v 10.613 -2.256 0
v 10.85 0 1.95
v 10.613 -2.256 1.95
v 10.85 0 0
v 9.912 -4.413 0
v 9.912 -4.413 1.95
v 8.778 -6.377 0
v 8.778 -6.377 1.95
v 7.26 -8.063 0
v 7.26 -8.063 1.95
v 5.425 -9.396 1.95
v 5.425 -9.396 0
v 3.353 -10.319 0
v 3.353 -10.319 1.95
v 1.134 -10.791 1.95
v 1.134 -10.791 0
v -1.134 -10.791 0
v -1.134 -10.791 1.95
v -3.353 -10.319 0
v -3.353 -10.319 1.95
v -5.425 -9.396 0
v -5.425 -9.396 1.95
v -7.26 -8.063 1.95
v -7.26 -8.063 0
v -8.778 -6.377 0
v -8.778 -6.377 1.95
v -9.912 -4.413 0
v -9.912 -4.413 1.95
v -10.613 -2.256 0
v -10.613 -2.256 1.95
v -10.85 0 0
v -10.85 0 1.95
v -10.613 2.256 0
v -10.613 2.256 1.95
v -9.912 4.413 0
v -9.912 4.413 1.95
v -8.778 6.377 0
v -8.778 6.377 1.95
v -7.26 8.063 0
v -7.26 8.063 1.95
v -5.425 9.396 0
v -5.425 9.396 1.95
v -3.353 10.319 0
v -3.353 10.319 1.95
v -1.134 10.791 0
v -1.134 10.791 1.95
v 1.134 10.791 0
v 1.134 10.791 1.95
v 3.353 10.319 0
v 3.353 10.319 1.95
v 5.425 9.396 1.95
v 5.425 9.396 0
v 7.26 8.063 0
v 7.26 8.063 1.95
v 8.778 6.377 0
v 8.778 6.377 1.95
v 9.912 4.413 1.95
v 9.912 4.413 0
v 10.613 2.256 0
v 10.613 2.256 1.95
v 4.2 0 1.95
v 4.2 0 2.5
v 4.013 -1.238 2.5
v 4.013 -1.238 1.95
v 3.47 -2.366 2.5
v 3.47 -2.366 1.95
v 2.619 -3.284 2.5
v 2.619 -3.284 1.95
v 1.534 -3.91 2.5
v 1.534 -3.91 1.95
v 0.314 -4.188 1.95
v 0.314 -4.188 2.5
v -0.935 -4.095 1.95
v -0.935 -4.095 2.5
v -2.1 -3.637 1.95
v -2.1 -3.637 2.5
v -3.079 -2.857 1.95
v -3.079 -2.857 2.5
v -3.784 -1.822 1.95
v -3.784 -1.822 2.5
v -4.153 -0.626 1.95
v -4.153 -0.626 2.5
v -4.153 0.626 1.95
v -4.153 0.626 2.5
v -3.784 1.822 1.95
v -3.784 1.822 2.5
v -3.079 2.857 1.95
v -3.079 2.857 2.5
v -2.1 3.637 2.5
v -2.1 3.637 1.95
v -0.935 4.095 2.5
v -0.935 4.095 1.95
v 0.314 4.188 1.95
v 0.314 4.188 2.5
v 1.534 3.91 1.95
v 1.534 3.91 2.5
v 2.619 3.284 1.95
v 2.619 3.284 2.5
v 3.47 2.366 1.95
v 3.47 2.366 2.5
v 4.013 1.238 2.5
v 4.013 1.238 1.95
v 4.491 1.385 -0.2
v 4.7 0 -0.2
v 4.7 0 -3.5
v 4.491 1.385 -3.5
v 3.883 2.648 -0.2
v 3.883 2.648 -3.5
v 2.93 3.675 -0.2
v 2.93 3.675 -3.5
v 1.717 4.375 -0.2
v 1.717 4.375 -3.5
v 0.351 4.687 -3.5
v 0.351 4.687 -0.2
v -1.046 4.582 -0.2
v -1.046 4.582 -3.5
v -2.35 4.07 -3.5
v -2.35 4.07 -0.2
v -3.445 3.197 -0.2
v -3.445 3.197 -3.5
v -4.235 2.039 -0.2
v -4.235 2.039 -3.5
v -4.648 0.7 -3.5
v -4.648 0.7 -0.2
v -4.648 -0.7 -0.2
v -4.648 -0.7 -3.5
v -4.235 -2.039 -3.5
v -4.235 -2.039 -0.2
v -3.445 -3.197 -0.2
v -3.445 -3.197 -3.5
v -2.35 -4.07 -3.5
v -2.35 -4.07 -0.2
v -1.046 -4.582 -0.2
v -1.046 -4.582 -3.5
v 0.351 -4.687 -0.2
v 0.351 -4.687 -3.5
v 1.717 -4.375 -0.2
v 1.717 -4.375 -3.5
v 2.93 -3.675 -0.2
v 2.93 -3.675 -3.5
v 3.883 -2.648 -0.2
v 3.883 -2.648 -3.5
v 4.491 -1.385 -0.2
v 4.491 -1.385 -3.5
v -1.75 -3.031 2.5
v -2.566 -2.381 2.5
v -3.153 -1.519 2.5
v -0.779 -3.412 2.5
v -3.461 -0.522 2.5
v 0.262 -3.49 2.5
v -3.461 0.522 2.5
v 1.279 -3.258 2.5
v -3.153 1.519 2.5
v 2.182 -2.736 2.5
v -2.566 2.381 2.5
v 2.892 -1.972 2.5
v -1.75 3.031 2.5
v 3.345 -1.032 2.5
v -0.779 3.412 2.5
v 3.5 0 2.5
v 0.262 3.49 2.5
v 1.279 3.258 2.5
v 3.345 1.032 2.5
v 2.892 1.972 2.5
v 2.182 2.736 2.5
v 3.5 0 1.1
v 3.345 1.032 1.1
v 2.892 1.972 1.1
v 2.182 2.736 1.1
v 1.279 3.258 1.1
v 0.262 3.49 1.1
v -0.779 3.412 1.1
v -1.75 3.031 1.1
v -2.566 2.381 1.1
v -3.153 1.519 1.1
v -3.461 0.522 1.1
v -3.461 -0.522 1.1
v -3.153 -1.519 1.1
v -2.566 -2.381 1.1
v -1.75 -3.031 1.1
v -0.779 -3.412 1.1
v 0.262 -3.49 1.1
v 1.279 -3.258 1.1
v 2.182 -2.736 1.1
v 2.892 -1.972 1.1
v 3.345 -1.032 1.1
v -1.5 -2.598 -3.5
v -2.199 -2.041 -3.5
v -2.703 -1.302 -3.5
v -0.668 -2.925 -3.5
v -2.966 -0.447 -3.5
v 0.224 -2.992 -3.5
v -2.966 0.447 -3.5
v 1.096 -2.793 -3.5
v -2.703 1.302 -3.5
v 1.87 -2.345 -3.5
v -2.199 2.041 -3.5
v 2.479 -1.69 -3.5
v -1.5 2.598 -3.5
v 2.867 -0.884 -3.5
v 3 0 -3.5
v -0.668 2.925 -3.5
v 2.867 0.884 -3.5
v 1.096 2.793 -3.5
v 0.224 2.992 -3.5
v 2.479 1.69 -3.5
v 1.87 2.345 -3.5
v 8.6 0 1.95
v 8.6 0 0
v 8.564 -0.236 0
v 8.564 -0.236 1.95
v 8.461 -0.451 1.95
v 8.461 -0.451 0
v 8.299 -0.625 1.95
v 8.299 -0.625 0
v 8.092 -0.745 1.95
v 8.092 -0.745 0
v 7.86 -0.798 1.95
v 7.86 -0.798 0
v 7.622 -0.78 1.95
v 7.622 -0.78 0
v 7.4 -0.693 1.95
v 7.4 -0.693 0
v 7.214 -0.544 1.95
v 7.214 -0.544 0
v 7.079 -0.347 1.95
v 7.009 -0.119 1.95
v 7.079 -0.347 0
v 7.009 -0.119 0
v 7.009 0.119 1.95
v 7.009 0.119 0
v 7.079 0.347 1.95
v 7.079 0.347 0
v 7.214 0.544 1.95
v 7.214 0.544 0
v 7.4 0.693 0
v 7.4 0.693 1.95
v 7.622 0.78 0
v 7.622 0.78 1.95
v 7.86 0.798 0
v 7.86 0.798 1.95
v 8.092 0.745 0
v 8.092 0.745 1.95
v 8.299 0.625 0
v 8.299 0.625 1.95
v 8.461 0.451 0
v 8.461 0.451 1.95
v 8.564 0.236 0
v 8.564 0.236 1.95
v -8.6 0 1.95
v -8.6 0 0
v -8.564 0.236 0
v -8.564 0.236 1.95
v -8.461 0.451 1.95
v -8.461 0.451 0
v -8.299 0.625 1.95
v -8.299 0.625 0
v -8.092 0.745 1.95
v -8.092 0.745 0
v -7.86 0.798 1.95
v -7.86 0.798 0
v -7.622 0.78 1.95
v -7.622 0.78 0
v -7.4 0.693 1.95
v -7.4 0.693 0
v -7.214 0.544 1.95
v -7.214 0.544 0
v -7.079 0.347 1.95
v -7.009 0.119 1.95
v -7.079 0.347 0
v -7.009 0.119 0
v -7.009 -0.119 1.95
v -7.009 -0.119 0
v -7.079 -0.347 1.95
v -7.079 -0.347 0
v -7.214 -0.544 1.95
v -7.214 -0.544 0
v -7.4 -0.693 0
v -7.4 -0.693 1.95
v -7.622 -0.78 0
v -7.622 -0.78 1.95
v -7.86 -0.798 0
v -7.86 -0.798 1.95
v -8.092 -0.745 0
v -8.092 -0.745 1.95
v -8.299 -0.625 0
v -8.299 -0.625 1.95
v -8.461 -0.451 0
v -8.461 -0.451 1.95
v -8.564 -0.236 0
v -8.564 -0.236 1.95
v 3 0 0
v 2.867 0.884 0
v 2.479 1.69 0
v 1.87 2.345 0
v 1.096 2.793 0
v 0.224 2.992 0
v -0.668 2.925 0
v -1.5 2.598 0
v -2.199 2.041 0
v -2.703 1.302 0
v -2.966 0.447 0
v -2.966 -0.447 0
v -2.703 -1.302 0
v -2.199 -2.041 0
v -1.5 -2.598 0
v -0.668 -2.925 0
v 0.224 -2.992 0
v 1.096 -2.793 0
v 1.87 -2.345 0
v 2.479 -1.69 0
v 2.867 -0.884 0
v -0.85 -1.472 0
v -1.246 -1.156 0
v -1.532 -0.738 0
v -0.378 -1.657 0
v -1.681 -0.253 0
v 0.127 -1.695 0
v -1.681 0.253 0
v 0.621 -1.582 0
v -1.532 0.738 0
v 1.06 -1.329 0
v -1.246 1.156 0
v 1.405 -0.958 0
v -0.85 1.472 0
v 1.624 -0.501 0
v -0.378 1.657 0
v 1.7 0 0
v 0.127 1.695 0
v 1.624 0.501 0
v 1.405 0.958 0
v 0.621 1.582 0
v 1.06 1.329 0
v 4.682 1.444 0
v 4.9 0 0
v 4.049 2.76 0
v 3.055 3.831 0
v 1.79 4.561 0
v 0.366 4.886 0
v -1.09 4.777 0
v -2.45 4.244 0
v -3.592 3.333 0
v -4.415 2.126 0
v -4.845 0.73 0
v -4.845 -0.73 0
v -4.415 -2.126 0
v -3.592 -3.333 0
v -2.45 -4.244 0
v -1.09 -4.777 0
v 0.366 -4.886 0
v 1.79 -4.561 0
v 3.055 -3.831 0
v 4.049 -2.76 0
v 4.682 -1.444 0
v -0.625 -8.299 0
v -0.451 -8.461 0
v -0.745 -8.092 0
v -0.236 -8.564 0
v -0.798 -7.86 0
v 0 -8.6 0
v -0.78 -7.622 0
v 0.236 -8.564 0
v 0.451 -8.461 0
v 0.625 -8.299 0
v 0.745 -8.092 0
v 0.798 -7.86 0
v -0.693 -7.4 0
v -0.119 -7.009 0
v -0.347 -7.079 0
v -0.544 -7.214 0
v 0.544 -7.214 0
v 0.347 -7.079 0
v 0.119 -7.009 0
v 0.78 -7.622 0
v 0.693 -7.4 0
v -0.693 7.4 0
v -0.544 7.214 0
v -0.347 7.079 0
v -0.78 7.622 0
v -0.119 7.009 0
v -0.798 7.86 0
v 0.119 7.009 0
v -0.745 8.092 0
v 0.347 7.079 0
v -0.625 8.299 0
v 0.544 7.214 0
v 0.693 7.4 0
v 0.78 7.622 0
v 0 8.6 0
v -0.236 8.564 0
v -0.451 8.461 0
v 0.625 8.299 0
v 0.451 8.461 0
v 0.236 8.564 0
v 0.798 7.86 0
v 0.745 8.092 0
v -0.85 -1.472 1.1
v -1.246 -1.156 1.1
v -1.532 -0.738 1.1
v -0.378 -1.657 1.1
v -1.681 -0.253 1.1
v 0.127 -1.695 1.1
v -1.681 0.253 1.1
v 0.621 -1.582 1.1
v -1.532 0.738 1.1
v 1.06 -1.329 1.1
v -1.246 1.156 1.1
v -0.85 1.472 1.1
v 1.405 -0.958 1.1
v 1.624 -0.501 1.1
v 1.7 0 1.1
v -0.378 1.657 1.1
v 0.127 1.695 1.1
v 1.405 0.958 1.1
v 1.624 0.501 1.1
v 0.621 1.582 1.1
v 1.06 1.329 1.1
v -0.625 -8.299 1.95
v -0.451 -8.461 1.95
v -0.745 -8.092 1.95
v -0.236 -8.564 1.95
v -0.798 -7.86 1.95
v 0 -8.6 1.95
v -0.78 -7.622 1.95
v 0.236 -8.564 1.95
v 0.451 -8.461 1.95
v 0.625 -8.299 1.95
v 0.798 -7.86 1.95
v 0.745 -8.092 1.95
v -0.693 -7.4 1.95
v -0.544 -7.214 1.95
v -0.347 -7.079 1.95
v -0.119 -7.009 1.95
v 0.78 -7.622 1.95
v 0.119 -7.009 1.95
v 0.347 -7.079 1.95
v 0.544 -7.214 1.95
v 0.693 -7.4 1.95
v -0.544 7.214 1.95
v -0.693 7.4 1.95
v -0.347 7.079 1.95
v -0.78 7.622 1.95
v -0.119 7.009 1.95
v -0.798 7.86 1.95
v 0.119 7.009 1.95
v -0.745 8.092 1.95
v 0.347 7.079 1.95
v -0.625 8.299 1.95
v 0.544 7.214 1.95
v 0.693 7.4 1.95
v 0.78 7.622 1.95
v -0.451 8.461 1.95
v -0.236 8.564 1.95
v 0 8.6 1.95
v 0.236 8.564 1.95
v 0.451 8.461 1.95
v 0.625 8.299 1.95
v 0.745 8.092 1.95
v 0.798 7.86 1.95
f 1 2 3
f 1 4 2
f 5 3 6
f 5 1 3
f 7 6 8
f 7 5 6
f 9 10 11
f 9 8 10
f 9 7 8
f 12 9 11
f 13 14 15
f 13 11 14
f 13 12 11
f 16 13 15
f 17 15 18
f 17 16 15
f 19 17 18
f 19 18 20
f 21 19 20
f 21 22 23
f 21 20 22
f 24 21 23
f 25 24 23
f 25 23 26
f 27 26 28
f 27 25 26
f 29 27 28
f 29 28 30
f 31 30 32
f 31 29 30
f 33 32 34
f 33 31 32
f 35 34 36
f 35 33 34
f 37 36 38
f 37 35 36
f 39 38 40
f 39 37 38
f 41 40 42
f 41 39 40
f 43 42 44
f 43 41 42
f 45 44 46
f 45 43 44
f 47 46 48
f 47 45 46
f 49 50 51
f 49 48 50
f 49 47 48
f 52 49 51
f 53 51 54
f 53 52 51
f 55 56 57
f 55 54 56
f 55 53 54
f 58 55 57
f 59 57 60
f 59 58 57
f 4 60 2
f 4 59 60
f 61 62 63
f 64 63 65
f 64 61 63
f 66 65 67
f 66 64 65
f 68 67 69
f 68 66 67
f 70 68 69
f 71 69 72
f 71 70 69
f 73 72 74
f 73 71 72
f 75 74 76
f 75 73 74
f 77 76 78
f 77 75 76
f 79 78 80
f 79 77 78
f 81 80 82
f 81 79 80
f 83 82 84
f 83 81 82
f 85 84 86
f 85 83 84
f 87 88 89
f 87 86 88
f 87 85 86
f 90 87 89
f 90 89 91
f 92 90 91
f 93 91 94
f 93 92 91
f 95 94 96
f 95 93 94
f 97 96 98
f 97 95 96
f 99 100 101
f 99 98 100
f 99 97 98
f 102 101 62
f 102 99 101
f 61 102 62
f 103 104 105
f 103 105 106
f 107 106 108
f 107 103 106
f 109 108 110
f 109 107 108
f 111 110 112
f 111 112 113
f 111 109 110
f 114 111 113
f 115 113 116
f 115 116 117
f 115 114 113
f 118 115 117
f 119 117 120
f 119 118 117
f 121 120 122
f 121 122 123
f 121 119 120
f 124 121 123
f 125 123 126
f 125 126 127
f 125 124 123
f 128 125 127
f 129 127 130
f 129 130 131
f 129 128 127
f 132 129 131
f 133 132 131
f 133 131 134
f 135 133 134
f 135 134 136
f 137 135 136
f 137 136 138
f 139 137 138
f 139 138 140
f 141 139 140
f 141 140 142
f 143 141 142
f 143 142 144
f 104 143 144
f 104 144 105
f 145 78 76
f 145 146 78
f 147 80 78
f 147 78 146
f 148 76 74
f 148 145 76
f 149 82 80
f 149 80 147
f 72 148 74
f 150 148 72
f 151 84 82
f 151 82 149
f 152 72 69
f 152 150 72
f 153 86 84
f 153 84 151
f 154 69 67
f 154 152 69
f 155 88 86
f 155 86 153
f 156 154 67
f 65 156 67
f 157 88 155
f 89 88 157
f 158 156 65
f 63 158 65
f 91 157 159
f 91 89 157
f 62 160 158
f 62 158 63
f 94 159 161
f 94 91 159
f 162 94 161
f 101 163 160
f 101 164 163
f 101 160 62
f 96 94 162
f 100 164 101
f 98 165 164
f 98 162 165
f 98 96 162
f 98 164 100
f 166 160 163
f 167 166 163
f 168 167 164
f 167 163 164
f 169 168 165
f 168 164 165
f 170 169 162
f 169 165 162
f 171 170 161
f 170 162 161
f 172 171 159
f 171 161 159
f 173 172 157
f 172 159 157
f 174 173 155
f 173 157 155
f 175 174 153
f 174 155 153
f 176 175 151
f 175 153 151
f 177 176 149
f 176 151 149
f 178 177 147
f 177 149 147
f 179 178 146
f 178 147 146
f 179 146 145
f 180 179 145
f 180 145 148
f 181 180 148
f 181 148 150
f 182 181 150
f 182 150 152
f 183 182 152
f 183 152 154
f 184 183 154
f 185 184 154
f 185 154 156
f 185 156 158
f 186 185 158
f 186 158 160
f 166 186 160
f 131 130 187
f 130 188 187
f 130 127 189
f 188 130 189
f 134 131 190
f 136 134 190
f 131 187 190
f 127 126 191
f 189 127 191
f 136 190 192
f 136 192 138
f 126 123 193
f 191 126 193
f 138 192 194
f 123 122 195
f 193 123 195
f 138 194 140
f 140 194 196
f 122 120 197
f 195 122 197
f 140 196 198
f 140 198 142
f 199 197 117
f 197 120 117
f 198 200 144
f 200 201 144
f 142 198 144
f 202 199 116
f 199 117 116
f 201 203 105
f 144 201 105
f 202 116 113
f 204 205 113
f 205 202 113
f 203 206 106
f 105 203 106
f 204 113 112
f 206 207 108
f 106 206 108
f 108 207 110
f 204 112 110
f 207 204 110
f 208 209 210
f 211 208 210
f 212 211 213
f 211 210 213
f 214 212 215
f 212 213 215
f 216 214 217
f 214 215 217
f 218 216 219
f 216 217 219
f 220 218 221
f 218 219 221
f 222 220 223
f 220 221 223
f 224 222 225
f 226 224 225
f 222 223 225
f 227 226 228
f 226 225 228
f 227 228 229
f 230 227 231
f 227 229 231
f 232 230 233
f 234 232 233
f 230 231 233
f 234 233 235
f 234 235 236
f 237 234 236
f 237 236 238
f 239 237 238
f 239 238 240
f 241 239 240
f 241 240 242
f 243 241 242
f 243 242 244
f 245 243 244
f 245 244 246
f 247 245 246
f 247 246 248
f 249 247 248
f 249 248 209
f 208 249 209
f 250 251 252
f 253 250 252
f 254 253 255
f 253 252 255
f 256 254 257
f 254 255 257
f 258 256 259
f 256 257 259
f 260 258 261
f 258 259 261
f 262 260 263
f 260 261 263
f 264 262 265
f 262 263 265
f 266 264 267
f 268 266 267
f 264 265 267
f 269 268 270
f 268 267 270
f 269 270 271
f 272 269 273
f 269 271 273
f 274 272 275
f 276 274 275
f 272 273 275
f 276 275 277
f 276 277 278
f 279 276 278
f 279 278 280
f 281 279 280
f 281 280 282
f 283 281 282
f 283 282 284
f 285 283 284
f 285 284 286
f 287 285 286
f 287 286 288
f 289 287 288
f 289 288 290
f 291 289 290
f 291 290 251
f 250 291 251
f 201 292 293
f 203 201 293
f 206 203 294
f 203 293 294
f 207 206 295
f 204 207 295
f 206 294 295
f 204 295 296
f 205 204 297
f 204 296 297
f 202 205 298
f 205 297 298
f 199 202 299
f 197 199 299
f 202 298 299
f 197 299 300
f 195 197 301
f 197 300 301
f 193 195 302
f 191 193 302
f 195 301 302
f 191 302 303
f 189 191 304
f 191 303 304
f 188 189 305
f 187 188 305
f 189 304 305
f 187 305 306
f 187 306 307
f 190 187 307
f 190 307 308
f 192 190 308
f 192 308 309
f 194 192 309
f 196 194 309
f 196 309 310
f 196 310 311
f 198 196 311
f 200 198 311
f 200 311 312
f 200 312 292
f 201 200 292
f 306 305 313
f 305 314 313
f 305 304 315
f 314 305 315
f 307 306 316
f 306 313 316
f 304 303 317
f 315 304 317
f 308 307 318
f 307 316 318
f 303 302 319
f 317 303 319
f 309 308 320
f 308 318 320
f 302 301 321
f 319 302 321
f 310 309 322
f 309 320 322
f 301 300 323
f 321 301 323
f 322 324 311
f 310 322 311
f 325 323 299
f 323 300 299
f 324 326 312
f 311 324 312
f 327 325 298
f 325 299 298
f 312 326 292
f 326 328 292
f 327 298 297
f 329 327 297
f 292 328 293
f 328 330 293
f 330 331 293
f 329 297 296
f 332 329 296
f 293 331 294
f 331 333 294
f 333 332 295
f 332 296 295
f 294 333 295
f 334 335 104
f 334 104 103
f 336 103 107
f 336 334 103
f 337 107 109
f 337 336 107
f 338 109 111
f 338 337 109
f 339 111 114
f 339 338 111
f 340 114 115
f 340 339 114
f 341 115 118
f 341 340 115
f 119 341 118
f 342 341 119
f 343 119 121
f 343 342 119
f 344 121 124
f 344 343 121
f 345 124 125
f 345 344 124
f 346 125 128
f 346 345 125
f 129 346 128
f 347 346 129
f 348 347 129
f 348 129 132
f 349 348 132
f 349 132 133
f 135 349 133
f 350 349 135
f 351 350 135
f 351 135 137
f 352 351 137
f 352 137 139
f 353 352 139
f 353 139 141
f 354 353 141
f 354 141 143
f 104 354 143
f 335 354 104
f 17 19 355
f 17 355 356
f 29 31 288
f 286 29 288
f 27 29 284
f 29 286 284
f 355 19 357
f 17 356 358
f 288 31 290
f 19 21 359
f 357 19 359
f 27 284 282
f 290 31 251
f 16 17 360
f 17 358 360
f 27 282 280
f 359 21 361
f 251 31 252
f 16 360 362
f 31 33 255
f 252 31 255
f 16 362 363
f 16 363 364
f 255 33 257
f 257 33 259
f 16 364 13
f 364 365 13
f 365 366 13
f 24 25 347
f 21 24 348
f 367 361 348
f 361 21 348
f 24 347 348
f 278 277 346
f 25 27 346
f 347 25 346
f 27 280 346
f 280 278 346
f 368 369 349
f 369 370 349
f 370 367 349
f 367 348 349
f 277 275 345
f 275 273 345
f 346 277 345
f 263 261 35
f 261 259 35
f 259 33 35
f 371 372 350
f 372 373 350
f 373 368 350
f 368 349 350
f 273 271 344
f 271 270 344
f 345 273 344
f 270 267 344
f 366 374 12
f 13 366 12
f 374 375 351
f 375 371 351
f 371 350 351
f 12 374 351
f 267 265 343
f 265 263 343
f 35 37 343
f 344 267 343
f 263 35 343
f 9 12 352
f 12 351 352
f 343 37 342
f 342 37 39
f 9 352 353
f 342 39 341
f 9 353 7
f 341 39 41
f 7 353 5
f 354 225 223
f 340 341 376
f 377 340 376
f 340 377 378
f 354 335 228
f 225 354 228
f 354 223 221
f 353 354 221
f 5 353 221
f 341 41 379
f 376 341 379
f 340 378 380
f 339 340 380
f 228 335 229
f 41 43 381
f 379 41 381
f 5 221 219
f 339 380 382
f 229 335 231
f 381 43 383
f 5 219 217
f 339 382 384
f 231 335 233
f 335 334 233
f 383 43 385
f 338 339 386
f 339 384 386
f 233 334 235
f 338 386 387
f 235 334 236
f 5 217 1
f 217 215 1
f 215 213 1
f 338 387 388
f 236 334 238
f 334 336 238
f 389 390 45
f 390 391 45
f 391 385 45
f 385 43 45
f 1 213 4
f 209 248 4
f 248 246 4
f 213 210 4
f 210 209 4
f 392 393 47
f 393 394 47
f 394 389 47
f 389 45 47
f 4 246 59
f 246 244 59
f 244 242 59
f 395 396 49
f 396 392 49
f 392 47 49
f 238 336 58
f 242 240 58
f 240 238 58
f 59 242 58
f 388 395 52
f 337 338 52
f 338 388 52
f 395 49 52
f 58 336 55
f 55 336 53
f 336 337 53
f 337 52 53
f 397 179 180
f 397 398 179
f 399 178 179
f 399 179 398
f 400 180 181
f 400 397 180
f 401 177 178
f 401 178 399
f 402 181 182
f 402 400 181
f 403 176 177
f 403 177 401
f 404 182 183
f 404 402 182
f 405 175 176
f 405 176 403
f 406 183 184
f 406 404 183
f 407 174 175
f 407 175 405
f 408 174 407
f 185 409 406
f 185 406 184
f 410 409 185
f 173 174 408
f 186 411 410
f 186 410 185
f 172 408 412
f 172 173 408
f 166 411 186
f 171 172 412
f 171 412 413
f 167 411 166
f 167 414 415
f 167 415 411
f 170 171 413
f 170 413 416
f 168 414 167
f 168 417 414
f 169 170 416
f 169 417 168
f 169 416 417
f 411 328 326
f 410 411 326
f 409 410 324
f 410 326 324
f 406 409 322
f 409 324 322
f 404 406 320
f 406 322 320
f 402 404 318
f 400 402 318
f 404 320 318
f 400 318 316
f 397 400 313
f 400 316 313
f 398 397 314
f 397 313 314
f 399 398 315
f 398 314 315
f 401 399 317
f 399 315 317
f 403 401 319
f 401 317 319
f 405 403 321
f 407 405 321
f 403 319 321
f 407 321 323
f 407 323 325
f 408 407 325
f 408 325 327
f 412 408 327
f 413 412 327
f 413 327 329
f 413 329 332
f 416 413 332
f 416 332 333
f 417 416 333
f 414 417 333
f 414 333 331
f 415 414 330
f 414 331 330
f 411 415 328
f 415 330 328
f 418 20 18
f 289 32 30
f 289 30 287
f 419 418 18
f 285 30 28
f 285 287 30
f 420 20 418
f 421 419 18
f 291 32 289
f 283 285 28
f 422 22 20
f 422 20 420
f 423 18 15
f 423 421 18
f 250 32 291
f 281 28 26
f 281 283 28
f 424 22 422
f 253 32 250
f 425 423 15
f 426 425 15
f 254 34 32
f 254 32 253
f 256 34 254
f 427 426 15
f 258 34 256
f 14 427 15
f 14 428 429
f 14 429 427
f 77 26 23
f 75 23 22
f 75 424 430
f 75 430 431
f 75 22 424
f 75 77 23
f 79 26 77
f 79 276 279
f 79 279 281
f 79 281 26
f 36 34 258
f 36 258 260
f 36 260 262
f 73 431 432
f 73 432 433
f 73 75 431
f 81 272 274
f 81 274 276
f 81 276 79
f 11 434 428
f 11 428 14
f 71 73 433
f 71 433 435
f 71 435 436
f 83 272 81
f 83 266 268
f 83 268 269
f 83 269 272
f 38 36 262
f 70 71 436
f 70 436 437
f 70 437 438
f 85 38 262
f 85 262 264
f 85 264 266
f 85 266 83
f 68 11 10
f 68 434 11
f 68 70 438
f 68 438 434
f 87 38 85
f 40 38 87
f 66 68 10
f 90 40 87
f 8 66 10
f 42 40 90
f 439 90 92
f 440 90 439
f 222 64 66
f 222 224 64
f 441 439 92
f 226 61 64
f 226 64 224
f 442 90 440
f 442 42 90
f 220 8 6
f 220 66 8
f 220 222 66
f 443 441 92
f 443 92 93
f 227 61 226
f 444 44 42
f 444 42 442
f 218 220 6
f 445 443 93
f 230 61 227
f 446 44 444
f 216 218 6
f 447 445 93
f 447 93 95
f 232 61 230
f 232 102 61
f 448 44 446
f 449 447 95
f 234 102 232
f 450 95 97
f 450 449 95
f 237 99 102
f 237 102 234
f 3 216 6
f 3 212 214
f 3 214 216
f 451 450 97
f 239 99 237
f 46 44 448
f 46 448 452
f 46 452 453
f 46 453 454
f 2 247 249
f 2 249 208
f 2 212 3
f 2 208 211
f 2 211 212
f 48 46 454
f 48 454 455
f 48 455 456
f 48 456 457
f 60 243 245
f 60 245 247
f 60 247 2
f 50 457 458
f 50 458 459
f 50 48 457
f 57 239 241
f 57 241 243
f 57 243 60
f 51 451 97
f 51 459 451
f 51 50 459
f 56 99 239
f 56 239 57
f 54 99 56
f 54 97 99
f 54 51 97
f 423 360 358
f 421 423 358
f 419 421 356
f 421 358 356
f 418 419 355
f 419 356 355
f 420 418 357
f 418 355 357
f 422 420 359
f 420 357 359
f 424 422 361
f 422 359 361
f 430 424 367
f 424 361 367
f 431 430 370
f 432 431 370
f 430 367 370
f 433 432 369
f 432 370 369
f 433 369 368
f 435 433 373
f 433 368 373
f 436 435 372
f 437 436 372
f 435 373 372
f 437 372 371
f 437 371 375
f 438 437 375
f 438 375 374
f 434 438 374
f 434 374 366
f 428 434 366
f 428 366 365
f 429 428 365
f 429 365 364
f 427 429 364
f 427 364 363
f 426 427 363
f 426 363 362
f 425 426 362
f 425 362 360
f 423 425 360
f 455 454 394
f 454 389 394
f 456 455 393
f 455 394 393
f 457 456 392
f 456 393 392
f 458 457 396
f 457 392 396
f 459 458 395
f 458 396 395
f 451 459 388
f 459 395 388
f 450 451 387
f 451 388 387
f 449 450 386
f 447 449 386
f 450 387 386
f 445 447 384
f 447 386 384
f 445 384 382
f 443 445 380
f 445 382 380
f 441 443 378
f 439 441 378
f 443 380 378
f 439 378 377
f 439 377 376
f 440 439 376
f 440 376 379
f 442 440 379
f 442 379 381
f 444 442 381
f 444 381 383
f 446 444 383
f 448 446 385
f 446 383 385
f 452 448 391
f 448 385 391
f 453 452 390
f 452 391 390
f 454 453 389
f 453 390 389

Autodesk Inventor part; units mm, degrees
sketch "スケッチ1" plane through (0, 0, 0) normal (0, 0, 1) x (1, 0, 0)
  circle A0 centre (0, 0) radius 10.85
  dimension "d0" = 21.7
extrude "押し出し1" add sketch "スケッチ1" along normal blind 1.95
sketch "スケッチ2" plane through (0, 0, 0) normal (0, 0, 1) x (1, 0, 0)
  circle A0 centre (0, 0) radius 4.7
  dimension "d3" = 9.4
extrude "押し出し2" add sketch "スケッチ2" against normal blind 3.5
sketch "スケッチ3" plane through (0, 0, 0) normal (0, 0, 1) x (1, 0, 0)
  circle A0 centre (0, 0) radius 3
  dimension "d6" = 6
extrude "押し出し3" cut sketch "スケッチ3" against normal blind 3.5
sketch "スケッチ4" plane through (0, 0, 0) normal (0, 0, 1) x (1, 0, 0)
  circle A0 centre (0, 0) radius 4.2
  dimension "d9" = 8.4
extrude "押し出し4" add sketch "スケッチ4" along normal blind 2.5
sketch "スケッチ5" plane through (0, 0, 2.5) normal (0, 0, 1) x (1, 0, 0)
  circle A0 centre (0, 0) radius 3.5
  dimension "d12" = 7
extrude "押し出し5" cut sketch "スケッチ5" against normal blind 1.4
sketch "スケッチ6" plane through (0, 0, 0) normal (0, 0, 1) x (1, 0, 0)
  circle A0 centre (0, 0) radius 1.7
  dimension "d15" = 3.4
extrude "押し出し6" cut sketch "スケッチ6" along normal through all
sketch "スケッチ7" plane through (0, 0, 0) normal (0, 0, 1) x (1, 0, 0)
  circle A0 centre (7.8, 0) radius 0.8
  point P0 (0, 0)
  dimension "d18" = 1.6
  dimension "d19" = 7.8
extrude "押し出し7" cut sketch "スケッチ7" along normal through all
pattern_circular "円形状パターン1" count 4 over 360 about axis through (0, 0, -10) along (0, 0, 1) of "押し出し7"
chamfer "面取り1" distance 0.2 angle 45 1 edges at (-4.7, 0, 0)
properties part number "HbServoHorn01"
